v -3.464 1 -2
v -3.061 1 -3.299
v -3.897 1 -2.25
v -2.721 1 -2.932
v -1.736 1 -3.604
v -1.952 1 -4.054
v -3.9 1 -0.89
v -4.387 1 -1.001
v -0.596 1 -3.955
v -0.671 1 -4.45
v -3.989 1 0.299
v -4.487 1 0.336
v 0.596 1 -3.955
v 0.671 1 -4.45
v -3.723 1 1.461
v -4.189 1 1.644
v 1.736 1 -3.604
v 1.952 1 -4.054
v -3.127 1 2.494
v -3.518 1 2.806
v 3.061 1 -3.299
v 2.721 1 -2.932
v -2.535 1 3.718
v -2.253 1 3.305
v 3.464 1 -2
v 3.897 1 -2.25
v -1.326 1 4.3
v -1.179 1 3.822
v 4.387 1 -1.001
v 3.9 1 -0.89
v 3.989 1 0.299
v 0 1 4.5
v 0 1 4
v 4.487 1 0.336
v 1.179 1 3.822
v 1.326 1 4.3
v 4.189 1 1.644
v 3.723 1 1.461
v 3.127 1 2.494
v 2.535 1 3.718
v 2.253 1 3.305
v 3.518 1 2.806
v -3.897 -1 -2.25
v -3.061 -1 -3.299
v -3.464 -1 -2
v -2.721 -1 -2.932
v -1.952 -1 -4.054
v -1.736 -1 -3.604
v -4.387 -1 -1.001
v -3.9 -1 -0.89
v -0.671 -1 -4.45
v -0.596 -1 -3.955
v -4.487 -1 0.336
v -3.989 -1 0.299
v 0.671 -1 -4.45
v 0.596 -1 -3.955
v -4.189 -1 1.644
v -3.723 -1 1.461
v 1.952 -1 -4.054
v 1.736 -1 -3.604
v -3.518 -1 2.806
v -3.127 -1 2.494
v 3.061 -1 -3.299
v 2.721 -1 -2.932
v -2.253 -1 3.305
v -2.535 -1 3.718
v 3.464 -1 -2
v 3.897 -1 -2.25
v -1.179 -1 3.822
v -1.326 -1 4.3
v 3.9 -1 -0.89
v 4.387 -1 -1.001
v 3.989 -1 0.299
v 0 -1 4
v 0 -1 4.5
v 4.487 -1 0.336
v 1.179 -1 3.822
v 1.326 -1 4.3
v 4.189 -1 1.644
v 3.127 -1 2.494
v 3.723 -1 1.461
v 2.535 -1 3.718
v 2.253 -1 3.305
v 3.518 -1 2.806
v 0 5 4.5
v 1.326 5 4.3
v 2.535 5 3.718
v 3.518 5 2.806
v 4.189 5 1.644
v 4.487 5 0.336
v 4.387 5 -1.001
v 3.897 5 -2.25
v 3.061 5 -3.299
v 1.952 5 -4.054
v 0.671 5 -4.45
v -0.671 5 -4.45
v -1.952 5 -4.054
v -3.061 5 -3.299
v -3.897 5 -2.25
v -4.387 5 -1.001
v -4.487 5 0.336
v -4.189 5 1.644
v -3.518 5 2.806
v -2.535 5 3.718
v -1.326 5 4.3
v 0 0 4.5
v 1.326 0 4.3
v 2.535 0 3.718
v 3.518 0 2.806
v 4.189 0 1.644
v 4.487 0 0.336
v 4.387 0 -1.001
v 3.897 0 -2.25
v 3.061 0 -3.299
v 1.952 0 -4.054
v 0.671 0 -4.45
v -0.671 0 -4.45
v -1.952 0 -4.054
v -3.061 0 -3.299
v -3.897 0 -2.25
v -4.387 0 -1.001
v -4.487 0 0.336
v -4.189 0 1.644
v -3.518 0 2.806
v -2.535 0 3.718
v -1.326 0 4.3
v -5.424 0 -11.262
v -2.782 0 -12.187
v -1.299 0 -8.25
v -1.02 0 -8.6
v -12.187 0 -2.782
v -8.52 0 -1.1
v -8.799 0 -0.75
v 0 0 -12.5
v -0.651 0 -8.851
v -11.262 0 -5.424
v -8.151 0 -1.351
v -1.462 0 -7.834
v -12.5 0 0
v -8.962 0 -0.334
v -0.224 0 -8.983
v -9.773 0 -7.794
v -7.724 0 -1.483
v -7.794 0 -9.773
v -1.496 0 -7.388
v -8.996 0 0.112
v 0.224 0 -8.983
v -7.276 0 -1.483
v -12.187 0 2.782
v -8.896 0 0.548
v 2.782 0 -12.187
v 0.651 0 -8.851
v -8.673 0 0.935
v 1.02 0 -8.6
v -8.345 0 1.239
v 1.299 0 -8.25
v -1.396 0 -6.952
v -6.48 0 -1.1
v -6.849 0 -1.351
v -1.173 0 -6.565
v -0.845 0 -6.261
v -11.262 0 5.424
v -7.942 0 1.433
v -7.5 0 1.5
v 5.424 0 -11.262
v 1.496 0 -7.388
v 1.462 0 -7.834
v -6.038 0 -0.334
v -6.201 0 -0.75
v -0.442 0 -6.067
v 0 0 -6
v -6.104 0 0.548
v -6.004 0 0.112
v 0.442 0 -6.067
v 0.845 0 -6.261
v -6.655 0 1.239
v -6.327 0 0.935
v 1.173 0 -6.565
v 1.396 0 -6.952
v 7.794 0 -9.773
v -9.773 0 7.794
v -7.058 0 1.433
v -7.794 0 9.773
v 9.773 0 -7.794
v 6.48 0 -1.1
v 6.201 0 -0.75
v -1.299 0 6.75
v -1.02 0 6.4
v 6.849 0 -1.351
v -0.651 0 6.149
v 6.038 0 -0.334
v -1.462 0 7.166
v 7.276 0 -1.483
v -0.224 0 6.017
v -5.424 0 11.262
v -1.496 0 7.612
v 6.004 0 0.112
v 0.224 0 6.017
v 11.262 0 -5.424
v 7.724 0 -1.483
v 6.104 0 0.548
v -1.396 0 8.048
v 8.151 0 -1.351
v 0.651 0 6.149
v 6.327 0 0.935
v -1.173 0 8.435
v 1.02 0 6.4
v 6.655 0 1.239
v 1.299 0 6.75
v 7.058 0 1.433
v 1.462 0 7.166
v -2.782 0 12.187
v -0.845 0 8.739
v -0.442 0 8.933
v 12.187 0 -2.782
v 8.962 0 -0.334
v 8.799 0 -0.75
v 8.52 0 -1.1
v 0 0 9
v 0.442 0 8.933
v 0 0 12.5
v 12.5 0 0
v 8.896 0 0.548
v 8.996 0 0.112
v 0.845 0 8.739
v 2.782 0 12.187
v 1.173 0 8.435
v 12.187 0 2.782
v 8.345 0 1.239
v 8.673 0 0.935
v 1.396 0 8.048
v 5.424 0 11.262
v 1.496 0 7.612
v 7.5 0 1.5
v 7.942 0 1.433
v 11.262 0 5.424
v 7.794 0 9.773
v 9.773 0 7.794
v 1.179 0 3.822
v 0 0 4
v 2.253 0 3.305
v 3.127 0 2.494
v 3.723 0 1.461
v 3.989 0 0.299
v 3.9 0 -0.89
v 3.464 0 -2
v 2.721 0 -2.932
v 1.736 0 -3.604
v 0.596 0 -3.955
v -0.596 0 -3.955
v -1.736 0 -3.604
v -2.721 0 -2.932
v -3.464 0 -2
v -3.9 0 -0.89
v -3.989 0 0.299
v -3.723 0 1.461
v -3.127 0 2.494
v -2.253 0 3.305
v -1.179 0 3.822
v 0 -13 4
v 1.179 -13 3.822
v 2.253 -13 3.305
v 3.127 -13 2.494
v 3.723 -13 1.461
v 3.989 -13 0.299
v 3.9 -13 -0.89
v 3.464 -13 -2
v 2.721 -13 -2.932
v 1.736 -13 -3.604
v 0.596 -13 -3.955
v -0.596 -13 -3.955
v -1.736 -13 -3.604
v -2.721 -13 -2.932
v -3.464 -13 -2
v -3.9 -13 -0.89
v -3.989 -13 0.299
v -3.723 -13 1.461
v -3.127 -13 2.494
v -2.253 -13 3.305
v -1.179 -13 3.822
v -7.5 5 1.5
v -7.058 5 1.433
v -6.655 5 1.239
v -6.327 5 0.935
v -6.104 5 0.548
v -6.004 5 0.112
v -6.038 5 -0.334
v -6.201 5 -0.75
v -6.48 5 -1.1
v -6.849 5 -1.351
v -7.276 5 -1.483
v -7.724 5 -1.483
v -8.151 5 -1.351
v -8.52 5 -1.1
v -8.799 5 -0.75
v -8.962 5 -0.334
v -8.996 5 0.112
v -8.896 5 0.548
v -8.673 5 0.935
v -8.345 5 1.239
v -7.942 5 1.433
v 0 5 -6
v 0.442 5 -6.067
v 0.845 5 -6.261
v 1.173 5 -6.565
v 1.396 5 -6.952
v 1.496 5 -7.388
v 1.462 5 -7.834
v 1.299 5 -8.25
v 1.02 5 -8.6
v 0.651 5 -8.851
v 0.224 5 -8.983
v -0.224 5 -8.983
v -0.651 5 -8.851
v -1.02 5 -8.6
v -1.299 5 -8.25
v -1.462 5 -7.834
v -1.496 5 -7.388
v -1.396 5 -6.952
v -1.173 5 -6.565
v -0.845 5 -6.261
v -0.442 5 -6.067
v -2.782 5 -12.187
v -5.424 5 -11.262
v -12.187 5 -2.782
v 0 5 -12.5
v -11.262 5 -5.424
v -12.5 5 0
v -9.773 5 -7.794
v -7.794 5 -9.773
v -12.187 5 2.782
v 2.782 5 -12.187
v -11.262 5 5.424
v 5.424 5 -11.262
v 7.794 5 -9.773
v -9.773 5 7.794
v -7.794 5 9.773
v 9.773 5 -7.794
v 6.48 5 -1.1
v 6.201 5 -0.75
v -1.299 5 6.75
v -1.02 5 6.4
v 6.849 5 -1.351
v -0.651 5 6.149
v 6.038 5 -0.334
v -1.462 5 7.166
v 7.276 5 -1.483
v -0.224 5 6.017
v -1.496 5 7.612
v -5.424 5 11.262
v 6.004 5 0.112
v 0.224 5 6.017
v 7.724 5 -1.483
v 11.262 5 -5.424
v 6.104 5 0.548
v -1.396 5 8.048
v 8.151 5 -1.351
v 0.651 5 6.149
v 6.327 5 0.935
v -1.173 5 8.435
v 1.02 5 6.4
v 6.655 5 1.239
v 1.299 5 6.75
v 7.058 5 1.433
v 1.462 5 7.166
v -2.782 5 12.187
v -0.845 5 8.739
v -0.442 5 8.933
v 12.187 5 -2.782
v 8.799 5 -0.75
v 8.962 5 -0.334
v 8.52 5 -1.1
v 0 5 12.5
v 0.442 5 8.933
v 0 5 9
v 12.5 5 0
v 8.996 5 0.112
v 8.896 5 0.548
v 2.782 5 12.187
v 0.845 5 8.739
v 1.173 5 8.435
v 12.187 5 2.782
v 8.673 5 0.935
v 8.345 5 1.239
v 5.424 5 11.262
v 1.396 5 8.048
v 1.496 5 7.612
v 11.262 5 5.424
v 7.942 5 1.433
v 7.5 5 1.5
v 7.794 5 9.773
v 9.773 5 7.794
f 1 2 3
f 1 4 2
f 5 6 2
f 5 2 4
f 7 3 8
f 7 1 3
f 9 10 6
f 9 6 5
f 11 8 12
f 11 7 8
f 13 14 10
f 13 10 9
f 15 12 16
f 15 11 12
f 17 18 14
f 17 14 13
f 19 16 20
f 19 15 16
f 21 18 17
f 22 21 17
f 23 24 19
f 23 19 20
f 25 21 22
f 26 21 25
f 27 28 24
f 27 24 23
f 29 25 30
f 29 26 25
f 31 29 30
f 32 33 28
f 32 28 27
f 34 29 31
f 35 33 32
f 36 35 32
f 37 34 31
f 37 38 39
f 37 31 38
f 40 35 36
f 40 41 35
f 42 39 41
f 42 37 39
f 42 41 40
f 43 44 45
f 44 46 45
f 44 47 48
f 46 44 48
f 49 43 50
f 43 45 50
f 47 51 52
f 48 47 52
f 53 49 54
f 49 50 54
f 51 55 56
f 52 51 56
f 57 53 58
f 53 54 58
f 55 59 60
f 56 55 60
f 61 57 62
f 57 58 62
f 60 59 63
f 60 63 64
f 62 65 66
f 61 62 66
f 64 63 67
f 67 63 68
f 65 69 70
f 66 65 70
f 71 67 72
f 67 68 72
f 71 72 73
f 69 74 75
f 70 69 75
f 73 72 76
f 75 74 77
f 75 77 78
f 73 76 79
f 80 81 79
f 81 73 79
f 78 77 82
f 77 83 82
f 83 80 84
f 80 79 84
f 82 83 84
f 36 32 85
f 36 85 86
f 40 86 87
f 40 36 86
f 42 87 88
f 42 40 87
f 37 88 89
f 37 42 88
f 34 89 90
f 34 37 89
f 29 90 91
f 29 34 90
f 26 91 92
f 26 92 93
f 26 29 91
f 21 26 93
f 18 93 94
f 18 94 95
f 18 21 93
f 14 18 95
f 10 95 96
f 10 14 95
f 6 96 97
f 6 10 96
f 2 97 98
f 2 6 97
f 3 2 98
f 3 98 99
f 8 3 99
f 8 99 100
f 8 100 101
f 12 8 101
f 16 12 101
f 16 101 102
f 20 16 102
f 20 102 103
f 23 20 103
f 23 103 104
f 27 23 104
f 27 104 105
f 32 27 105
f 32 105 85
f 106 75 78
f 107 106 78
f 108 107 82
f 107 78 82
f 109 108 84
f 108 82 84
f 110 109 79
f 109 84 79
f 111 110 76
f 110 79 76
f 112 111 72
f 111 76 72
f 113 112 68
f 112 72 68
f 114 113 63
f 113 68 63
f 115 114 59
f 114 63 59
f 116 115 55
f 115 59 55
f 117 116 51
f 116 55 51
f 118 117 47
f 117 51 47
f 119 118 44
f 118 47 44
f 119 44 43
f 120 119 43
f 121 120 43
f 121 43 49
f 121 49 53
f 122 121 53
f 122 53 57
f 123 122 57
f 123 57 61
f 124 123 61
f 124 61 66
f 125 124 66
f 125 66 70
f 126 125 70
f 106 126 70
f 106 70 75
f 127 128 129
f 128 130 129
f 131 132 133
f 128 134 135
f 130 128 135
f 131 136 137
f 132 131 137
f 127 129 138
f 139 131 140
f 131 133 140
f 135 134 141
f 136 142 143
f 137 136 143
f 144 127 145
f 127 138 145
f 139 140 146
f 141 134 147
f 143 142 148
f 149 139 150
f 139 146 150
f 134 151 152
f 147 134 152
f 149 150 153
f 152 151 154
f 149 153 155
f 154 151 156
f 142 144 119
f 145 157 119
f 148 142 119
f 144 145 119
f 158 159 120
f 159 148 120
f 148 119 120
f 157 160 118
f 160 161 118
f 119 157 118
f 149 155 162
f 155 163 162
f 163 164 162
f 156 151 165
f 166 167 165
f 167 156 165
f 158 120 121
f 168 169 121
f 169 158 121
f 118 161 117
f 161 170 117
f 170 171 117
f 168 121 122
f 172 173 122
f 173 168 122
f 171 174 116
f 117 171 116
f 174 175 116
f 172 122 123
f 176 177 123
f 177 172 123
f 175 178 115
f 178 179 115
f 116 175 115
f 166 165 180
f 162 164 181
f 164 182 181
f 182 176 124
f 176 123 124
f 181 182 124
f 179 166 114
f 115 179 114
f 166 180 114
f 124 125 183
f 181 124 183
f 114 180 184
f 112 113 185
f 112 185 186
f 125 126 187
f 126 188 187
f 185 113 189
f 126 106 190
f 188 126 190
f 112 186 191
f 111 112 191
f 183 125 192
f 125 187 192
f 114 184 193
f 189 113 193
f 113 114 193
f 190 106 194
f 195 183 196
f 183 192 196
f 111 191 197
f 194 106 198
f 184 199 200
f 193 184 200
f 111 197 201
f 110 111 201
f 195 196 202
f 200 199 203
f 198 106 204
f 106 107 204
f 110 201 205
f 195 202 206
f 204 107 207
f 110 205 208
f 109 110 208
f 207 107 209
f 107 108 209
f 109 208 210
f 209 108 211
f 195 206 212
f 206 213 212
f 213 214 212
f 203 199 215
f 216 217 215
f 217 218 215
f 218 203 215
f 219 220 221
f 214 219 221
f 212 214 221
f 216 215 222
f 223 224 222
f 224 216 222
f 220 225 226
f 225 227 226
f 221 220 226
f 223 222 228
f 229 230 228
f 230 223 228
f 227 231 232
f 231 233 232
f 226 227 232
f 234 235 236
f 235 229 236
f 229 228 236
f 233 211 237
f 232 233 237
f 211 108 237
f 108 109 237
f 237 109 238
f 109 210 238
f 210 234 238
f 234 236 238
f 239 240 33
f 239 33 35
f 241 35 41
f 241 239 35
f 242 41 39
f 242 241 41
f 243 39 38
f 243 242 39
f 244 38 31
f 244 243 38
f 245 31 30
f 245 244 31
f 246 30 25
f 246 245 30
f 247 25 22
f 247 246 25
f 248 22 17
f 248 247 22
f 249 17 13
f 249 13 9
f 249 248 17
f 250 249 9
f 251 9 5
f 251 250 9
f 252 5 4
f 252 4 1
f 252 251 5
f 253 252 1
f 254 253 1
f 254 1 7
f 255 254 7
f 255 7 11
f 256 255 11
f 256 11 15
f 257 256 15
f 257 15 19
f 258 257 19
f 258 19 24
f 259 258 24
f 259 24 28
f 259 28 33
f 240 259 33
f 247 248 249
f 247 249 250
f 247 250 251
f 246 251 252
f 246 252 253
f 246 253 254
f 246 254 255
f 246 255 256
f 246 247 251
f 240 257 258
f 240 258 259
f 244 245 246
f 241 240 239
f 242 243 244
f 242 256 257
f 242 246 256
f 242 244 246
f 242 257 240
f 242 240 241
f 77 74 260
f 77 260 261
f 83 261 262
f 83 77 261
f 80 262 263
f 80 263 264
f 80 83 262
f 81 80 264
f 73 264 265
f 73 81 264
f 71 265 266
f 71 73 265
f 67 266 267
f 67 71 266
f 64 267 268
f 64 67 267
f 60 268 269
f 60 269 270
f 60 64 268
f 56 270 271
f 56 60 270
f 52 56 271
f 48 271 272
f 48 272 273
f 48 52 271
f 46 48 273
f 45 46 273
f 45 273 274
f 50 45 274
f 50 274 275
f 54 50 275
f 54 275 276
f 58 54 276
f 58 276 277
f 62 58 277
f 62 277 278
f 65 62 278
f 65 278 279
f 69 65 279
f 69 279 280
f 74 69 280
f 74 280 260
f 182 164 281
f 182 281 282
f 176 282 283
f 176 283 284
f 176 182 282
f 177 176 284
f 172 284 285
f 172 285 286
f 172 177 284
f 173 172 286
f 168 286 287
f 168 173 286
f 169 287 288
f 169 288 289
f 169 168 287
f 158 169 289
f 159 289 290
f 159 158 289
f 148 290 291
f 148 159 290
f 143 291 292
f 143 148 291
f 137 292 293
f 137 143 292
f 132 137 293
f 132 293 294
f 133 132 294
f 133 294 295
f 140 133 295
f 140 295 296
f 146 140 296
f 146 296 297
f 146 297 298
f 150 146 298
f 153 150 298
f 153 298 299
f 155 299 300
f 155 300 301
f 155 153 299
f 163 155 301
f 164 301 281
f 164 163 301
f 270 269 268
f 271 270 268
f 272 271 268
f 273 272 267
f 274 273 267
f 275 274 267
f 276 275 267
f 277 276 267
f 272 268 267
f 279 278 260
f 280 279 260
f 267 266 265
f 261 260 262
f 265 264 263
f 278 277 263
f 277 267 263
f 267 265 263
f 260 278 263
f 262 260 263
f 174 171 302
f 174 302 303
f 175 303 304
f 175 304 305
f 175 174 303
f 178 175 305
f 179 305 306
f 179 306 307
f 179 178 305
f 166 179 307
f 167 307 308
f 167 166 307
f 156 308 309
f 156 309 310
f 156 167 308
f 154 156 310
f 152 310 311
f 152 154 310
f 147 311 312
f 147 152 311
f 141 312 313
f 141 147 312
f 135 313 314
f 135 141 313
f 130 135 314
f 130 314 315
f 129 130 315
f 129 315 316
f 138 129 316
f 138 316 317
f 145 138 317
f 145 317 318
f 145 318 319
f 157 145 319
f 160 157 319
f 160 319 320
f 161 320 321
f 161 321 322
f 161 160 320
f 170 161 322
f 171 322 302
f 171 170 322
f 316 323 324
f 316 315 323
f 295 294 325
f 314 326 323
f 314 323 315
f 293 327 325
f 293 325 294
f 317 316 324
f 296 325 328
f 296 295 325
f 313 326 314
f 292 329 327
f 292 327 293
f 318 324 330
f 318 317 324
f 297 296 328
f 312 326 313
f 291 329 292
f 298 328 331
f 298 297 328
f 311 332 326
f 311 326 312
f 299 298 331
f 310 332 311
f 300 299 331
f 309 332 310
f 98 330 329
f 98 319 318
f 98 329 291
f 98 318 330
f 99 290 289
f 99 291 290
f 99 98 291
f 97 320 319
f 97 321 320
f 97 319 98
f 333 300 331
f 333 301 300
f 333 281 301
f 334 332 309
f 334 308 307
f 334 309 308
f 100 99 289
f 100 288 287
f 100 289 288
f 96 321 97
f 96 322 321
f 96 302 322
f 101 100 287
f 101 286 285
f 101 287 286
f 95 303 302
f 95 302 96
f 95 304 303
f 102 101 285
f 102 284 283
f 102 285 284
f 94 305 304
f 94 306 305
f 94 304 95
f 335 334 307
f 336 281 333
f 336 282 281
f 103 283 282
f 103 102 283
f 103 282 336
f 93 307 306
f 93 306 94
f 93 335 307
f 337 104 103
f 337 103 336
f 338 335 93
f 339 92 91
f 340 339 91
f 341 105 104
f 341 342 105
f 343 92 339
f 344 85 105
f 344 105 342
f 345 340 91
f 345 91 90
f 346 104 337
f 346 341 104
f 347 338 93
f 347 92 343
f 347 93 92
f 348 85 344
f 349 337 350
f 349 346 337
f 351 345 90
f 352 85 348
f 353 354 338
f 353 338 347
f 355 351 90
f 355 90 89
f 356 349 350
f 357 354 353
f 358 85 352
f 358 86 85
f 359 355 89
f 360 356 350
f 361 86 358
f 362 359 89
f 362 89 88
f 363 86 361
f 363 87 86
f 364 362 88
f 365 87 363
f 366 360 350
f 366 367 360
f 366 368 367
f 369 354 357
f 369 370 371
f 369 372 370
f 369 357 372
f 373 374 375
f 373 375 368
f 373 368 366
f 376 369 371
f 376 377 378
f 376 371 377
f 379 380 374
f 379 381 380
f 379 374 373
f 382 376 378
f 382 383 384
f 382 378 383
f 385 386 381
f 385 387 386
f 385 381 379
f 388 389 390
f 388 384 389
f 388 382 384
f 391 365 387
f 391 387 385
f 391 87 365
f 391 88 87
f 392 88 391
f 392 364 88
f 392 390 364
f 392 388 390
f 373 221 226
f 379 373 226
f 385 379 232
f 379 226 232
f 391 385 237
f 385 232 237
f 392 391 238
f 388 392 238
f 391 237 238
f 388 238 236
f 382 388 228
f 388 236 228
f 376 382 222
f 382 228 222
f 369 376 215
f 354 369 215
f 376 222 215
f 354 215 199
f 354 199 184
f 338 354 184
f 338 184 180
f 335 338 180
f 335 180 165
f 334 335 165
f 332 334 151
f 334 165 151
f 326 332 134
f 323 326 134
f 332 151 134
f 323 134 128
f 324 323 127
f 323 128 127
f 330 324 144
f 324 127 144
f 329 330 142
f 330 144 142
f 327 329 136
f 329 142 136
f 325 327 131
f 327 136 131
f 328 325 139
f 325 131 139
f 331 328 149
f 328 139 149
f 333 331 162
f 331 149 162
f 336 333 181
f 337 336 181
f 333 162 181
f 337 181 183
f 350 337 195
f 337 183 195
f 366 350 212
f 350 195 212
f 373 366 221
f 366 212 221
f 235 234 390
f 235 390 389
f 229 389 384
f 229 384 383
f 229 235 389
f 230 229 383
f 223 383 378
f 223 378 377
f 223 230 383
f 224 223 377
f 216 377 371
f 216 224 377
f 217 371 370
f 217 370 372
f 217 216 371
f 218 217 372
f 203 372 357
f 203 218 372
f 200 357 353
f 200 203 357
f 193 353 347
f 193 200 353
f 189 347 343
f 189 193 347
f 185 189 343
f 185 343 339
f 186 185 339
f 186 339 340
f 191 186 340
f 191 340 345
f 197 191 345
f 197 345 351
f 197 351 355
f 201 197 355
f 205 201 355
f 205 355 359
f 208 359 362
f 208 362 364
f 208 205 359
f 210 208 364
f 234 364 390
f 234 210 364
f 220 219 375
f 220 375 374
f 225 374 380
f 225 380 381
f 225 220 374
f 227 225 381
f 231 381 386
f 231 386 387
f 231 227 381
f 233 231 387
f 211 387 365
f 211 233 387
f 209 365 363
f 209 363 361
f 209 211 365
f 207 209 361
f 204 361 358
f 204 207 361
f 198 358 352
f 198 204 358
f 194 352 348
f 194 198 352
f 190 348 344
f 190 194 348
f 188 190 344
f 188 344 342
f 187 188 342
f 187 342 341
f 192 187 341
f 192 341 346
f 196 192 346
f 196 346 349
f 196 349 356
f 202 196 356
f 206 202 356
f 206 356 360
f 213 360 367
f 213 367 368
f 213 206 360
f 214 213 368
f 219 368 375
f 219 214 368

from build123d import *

# Parameters (mm, degrees)
SKETCH1_R                = 12.5
SKETCH1_R_2              = 1.5
SKETCH1_R_3              = 4.5
BOSS_EXTRUDE1_DEPTH      = 5
SKETCH1_3_R              = 4
BOSS_EXTRUDE2_DEPTH      = 13
BOSS_EXTRUDE3_DEPTH      = 1
BOSS_EXTRUDE3_DEPTH_BACK = 1
SKETCH1_4_R              = 4.5
SKETCH1_4_R_2            = 4


with BuildPart() as part:
    # Sketch1 → Boss-Extrude1 (new body)
    with BuildSketch(Plane(origin=(0, 0, 0), x_dir=(1, 0, 0), z_dir=(0, 1, 0))):
        Circle(SKETCH1_R)
        with Locations((-7.5, 0)):
            Circle(SKETCH1_R_2, mode=Mode.SUBTRACT)
        with Locations((0, -7.5)):
            Circle(SKETCH1_R_2, mode=Mode.SUBTRACT)
        Circle(SKETCH1_R_3, mode=Mode.SUBTRACT)
        with Locations((7.5, 0)):
            Circle(SKETCH1_R_2, mode=Mode.SUBTRACT)
        with Locations((0, 7.5)):
            Circle(SKETCH1_R_2, mode=Mode.SUBTRACT)
    extrude(amount=BOSS_EXTRUDE1_DEPTH)



with BuildPart() as body_2:
    # Sketch1<3> → Boss-Extrude2 (new body)
    with BuildSketch(Plane(origin=(0, 0, 0), x_dir=(1, 0, 0), z_dir=(0, 1, 0))):
        Circle(SKETCH1_3_R)
    extrude(amount=-BOSS_EXTRUDE2_DEPTH)


with BuildPart() as part_1:
    add(part.part)

    add(body_2.part)  # Boss-Extrude3 merges body 2
    # Sketch1<4> → Boss-Extrude3 (add, two sides: drawn at the far end of the back side and taken through both)
    with BuildSketch(Plane(origin=(0, 0, 0), x_dir=(1, 0, 0), z_dir=(0, 1, 0)).offset(-BOSS_EXTRUDE3_DEPTH_BACK)):
        Circle(SKETCH1_4_R)
        Circle(SKETCH1_4_R_2, mode=Mode.SUBTRACT)
    extrude(amount=BOSS_EXTRUDE3_DEPTH + BOSS_EXTRUDE3_DEPTH_BACK)


solid = part_1.part
